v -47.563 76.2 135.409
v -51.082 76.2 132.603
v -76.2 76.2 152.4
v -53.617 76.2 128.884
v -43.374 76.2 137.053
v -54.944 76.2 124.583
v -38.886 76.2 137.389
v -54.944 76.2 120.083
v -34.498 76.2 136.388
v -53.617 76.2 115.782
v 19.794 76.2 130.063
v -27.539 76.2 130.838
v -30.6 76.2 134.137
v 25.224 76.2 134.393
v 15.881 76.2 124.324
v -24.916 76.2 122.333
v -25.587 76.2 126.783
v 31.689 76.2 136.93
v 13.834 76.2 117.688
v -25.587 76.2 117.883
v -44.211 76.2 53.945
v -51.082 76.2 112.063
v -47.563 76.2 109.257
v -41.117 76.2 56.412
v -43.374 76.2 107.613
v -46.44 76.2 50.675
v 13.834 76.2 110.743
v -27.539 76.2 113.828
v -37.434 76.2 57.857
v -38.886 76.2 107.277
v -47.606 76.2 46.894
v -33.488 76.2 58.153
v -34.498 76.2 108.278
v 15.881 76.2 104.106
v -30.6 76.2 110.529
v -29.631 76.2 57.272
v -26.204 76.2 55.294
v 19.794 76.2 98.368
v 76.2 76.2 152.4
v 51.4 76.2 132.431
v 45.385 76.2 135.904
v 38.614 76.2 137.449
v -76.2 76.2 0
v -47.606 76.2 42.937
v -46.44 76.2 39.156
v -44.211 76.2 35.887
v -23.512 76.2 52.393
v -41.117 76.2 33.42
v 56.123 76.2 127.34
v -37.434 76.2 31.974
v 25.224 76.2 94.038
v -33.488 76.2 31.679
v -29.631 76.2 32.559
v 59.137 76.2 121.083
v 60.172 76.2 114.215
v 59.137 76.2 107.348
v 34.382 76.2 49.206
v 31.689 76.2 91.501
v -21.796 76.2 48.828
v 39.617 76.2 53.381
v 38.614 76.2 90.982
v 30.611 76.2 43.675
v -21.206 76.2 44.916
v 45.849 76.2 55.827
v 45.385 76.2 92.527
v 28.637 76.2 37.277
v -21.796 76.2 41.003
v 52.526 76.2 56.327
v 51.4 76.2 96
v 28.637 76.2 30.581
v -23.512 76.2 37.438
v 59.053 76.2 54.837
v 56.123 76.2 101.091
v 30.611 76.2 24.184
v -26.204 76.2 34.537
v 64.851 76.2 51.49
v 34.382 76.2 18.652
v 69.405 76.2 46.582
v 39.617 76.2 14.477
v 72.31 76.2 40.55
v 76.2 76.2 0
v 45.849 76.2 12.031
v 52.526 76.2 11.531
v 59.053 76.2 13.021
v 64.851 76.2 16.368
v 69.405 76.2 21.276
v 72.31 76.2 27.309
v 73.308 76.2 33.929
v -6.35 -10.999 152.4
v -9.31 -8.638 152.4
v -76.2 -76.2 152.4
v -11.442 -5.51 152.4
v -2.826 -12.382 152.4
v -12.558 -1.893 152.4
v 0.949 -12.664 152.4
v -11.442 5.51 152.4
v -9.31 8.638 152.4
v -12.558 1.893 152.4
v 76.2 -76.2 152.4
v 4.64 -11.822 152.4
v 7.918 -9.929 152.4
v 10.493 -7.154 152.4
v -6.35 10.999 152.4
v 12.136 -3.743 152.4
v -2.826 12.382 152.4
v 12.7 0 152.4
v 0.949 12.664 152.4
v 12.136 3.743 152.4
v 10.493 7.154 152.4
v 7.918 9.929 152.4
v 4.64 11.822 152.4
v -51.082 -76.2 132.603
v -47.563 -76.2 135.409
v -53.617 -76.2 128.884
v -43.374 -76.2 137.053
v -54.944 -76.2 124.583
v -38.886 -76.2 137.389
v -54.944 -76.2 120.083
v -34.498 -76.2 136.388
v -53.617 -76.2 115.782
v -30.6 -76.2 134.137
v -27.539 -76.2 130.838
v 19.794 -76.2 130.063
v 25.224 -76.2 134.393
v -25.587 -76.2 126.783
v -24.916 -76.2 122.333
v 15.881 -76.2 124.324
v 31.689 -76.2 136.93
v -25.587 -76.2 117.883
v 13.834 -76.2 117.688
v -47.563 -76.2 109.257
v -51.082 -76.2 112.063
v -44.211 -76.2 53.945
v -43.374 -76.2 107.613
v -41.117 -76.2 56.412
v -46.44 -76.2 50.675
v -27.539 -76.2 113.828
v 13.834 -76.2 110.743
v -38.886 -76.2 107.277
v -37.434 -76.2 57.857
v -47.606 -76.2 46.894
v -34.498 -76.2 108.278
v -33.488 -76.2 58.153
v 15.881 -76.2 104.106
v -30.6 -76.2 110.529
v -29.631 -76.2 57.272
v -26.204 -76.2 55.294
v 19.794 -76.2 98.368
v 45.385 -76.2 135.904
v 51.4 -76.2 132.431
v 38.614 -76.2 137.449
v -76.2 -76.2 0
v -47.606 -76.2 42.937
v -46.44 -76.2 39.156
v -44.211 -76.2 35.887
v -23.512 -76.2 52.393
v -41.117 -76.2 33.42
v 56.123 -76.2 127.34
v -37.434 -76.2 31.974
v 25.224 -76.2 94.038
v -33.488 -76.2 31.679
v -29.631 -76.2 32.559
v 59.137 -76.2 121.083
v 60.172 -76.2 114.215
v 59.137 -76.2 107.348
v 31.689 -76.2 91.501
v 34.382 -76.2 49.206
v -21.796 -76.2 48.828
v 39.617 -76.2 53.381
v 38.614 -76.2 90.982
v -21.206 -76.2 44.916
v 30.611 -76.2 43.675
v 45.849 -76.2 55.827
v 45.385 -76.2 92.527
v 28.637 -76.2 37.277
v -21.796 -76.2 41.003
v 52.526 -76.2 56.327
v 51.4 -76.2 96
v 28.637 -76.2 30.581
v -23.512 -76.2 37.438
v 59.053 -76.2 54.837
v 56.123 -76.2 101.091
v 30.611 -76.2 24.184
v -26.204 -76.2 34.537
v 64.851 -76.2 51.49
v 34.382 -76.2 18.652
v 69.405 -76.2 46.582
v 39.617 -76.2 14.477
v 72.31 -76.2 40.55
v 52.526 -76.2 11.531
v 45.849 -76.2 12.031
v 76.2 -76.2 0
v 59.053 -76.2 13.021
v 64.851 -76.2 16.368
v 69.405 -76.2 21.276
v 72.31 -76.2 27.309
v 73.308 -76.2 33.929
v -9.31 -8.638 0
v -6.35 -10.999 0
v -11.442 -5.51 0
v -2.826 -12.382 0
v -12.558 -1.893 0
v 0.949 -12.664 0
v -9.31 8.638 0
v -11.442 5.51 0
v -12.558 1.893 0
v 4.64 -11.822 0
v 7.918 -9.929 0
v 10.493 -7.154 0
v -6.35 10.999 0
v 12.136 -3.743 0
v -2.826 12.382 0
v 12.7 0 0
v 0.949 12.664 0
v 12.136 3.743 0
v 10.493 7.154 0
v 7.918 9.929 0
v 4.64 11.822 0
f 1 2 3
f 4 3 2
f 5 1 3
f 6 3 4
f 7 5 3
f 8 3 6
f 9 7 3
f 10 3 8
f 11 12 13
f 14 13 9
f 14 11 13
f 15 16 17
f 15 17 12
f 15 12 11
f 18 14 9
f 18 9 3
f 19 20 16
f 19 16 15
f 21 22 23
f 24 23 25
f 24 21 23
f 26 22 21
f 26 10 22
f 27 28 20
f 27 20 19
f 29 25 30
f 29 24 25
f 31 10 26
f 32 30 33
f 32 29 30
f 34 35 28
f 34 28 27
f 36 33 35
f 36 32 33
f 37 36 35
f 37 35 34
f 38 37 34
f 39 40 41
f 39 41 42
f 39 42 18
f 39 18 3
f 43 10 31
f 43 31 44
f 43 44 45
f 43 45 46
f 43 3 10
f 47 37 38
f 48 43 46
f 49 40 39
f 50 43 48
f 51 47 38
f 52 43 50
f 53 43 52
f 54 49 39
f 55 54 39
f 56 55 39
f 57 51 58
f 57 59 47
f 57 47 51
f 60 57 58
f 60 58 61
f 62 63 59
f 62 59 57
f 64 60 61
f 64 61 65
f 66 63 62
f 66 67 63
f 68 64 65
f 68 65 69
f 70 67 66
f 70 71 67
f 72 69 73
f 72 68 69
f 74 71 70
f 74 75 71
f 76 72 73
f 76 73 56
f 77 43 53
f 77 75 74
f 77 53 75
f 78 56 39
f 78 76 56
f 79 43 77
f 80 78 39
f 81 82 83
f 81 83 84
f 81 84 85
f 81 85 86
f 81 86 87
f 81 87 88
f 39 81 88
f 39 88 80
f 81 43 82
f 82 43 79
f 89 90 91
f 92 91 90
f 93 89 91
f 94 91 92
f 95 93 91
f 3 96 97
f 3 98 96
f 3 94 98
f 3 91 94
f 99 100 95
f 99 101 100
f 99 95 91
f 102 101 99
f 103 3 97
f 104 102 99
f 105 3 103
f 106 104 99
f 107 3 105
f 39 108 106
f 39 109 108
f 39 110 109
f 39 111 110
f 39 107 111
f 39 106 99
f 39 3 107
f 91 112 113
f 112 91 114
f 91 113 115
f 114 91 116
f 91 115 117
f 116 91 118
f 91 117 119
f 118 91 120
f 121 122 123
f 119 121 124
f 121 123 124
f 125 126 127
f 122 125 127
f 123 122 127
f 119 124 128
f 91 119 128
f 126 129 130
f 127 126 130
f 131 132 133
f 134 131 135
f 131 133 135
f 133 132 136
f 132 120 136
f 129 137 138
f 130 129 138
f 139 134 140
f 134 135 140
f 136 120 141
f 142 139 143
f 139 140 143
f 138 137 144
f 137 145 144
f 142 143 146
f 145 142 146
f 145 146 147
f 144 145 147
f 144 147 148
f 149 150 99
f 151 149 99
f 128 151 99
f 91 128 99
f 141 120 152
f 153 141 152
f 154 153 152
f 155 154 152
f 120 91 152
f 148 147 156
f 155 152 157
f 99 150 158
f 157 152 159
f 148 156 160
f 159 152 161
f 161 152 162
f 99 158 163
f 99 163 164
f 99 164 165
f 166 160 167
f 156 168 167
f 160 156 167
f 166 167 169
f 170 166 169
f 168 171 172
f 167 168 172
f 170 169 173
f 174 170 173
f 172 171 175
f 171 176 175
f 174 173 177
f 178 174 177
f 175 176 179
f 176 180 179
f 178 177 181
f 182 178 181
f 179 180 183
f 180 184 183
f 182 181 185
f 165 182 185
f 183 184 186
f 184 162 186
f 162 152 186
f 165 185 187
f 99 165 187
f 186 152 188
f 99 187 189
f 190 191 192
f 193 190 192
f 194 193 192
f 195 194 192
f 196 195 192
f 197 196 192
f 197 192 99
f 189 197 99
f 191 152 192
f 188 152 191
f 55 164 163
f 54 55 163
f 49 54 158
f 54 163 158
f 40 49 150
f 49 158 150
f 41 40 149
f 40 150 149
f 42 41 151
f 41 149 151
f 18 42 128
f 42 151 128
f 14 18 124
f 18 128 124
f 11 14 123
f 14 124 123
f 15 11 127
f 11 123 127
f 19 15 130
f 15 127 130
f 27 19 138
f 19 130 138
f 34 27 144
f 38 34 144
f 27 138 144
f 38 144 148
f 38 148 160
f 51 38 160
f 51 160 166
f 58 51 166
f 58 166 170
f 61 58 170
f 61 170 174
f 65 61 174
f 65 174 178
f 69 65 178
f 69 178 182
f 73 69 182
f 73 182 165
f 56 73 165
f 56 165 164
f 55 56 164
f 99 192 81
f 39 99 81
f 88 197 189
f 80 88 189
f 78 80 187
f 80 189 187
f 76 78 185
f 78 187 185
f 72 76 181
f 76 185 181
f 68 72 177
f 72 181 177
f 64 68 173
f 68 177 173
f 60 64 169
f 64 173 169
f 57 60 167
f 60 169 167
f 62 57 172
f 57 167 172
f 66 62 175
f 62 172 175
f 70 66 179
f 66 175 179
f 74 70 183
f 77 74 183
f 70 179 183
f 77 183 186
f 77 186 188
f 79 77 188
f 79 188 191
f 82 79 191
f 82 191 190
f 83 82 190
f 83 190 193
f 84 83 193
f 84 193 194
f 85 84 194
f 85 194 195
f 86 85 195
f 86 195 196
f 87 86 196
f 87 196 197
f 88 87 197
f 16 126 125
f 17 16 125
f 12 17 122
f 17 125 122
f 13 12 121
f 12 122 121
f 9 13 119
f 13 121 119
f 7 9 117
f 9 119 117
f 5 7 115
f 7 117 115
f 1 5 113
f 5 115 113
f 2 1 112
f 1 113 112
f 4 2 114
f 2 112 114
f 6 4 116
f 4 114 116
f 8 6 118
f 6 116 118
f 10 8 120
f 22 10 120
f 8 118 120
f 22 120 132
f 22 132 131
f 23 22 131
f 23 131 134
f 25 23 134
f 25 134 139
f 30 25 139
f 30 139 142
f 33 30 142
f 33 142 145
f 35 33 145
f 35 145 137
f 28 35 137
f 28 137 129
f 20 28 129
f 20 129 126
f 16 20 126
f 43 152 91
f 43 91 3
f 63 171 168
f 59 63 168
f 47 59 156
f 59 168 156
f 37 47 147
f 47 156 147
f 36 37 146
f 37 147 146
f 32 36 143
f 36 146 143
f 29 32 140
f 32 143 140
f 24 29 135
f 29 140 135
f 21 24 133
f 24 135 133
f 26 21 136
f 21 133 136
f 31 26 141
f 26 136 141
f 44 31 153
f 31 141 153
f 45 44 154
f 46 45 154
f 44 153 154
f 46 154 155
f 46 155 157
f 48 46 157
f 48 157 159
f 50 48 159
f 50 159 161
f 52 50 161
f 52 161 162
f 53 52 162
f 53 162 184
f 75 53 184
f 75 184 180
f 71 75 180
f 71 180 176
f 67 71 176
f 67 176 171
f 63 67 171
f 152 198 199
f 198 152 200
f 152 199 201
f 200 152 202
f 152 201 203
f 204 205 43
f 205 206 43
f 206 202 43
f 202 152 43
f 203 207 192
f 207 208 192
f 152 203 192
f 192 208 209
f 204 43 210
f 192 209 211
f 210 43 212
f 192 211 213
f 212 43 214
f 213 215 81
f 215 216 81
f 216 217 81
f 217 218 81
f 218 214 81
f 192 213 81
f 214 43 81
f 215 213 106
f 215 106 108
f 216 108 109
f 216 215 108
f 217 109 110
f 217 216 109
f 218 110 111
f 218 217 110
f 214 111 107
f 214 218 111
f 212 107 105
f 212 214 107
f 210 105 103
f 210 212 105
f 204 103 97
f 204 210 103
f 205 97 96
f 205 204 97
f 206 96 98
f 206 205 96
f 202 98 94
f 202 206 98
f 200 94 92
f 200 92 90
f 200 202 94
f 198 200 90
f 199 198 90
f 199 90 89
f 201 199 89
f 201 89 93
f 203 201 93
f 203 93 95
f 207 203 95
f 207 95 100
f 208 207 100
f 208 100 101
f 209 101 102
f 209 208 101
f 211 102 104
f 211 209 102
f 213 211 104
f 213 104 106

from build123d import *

# Parameters (mm, degrees)
F0_W     = 152.4
F0_H     = 152.4
F0_R     = 12.7
F1_DEPTH = 152.4
F2_R     = 15.0984188398
F2_R_2   = 23.2988824092
F2_R_3   = 22.4609439984
F2_R_4   = 13.2743249865
F3_DEPTH = 152.401


# Not quite as in the source:
# - the program builds the solid bodies; features that only make, move or delete a surface that nothing else refers to are left out


with BuildPart() as f1:
    # F0 (on Top) → F1 (new body)
    with BuildSketch(Plane.XY):
        Rectangle(F0_W, F0_H)
        Circle(F0_R, mode=Mode.SUBTRACT)
    extrude(amount=F1_DEPTH)

    # F2 (on face) → F3 (cut, through all)
    with BuildSketch(Plane.XZ.offset(76.2)):
        with Locations((-40.0141887367, 122.3329827189)):
            Circle(F2_R)
        with Locations((36.8730016053, 114.2153069377)):
            Circle(F2_R_2)
        with Locations((50.8471243083, 33.929079771)):
            Circle(F2_R_3)
        with Locations((-34.4802364707, 44.915728271)):
            Circle(F2_R_4)
    extrude(amount=-F3_DEPTH, mode=Mode.SUBTRACT)


solid = f1.part
